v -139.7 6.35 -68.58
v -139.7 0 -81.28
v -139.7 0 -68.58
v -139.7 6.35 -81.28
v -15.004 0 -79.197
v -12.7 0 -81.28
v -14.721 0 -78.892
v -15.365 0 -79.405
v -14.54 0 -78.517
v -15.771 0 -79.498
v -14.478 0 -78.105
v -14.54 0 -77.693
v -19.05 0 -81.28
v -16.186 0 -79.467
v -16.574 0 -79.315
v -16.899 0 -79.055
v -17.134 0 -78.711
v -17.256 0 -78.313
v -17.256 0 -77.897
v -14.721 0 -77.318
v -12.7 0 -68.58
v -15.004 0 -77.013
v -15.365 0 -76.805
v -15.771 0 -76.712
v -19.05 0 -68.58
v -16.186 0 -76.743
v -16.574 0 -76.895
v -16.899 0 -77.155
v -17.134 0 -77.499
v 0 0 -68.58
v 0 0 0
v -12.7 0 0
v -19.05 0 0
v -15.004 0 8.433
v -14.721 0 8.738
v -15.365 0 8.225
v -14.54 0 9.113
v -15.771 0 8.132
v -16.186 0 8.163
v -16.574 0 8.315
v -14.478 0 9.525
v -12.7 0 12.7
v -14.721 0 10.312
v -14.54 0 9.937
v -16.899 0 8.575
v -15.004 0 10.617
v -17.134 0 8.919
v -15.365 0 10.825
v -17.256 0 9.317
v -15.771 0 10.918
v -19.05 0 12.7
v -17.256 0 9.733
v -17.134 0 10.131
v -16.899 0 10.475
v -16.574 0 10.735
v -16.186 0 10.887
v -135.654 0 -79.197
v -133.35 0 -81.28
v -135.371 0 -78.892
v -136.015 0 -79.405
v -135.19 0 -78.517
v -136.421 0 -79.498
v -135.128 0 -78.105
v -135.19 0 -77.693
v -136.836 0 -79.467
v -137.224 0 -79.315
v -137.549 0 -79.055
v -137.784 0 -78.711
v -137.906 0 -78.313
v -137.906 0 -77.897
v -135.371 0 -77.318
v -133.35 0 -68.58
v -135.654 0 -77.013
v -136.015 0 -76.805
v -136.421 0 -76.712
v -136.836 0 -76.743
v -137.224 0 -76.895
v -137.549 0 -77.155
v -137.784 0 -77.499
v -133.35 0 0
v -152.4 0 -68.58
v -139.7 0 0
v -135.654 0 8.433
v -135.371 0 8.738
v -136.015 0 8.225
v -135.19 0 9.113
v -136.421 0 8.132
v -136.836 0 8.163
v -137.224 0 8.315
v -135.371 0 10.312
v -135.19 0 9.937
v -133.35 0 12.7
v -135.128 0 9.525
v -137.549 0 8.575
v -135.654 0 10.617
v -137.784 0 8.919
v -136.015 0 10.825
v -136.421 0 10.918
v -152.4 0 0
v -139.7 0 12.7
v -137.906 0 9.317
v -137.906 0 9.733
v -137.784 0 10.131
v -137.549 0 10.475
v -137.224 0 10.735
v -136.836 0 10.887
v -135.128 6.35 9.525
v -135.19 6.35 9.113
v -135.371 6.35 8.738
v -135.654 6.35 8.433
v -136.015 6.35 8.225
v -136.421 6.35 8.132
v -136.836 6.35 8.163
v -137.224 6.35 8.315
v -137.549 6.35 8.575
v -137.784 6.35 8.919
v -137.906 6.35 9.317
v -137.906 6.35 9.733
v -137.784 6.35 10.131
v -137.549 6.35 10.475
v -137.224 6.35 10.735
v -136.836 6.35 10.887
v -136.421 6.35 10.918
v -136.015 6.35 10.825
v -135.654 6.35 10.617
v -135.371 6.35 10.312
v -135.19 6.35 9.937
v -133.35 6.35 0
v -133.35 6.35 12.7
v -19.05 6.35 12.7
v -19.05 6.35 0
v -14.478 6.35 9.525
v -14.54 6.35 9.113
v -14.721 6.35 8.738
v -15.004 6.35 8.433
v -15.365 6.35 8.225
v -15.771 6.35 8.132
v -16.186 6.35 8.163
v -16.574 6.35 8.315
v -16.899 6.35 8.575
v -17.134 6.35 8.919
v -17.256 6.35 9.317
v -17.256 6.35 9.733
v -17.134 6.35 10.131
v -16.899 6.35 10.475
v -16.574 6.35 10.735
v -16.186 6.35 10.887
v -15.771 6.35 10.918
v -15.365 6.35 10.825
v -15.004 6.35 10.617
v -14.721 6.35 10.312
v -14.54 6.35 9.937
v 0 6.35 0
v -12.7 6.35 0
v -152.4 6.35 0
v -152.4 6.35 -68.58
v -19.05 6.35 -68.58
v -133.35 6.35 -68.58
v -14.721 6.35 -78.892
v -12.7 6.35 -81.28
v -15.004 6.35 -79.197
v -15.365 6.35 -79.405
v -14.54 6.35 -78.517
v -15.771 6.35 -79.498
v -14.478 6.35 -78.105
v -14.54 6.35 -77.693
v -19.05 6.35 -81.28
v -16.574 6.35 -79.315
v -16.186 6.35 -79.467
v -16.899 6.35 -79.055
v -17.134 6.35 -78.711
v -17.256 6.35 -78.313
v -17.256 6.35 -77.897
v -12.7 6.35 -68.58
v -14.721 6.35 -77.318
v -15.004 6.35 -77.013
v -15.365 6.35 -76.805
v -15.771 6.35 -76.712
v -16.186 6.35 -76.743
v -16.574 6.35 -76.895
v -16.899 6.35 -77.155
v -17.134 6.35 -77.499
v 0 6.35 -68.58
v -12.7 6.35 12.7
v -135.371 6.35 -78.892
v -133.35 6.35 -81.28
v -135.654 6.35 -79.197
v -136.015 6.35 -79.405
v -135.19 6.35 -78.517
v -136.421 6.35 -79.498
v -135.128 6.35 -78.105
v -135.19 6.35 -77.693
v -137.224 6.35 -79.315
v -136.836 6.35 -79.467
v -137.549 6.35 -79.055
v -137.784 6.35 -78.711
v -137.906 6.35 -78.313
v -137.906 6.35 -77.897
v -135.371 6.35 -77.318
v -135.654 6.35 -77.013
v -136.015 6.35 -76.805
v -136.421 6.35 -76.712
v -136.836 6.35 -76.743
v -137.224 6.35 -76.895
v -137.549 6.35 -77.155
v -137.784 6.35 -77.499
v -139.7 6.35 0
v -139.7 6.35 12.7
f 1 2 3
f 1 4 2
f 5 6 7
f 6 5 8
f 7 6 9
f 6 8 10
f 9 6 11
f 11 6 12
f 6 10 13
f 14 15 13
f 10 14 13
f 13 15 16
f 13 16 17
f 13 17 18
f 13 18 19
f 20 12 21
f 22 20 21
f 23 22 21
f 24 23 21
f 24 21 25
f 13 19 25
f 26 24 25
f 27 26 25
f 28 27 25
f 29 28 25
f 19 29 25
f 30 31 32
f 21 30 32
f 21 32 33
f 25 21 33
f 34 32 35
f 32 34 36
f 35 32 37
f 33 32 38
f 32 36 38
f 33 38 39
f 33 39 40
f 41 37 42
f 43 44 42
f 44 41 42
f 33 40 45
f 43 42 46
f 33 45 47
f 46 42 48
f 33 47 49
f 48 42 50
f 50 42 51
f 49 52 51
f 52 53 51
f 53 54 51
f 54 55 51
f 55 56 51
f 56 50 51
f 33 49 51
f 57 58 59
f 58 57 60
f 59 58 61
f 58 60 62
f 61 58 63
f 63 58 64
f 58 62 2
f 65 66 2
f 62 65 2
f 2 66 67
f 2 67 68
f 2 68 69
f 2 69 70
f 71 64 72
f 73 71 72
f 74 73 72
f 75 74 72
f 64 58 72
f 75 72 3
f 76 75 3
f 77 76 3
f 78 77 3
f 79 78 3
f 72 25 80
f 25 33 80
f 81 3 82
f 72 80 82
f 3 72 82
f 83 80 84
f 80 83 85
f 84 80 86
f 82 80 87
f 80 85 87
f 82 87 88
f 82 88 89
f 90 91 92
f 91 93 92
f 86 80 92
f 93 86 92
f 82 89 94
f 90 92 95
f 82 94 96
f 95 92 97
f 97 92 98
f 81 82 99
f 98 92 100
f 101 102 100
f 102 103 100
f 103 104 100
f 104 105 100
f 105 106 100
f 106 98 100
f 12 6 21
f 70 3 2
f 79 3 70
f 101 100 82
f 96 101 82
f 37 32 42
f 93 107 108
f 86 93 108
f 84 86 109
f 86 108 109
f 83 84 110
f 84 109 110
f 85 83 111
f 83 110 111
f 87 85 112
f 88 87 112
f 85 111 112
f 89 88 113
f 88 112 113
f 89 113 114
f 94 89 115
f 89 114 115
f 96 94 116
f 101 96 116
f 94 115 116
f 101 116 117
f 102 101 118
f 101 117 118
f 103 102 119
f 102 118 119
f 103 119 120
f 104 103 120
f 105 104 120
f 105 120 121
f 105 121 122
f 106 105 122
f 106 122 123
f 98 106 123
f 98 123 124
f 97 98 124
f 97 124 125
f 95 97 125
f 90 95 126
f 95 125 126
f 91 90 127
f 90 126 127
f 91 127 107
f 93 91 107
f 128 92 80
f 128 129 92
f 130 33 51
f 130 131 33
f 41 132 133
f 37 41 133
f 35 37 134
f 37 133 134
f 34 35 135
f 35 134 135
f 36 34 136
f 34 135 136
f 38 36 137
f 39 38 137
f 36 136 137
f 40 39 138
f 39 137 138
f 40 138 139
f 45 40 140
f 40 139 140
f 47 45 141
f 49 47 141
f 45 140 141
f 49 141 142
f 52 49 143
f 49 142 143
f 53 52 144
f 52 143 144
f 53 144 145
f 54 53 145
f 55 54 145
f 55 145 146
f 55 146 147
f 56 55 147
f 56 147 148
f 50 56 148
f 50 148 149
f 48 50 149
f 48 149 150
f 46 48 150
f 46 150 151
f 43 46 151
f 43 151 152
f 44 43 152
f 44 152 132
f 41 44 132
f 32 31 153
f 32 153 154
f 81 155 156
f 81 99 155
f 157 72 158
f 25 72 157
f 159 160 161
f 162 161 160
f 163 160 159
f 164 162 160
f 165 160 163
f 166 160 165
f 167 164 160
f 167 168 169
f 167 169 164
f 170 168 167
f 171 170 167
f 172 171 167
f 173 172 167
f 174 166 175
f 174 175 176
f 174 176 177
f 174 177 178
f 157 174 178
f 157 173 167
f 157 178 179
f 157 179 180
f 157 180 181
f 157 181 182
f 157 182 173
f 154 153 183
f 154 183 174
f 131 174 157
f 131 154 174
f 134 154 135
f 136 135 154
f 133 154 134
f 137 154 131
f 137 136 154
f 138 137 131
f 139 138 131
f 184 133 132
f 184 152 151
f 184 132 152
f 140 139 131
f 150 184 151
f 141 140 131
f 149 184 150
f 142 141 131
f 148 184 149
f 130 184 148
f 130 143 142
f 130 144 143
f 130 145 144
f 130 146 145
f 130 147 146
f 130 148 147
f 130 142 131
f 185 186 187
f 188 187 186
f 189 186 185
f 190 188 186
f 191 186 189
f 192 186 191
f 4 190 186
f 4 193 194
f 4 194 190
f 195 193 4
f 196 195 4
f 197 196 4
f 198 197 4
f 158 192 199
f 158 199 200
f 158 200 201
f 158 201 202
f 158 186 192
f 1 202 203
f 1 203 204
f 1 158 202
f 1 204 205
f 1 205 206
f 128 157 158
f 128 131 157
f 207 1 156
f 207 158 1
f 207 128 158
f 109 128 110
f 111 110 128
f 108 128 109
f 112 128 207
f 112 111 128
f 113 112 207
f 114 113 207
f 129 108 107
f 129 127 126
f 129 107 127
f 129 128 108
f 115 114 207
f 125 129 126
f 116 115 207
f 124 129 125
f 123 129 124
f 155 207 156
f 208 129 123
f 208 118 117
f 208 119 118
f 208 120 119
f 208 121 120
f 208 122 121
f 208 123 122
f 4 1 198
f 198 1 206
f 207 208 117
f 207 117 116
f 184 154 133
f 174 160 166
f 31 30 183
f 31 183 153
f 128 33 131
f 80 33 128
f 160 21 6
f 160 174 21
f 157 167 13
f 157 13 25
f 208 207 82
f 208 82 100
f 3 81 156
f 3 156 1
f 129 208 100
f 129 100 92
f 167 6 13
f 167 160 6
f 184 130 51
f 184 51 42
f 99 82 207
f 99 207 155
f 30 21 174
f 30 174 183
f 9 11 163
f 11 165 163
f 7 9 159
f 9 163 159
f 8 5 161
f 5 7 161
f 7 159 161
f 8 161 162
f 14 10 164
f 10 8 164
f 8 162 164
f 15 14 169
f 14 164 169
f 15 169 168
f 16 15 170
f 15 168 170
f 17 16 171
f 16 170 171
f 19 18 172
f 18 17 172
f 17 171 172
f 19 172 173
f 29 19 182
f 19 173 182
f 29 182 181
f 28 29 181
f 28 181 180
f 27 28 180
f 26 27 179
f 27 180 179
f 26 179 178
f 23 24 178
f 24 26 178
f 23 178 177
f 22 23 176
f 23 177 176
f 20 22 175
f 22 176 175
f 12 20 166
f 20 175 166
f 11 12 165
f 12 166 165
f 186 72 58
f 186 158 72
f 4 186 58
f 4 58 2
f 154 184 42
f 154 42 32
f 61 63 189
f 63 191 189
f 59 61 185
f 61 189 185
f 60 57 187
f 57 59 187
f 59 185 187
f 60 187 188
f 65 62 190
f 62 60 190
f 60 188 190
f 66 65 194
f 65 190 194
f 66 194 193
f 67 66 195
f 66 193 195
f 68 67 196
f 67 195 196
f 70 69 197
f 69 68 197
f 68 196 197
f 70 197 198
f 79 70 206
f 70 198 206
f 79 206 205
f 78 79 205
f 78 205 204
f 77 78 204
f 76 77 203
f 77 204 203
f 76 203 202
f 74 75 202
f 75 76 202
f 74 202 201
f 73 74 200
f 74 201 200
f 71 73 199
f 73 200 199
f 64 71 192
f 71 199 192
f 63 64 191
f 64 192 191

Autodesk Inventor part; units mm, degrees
ref_plane "YZ Plane" through (0, 0, 0) normal (1, 0, 0) x (0, 1, 0)
ref_plane "XZ Plane" through (0, 0, 0) normal (0, 1, 0) x (-1, 0, 0)
ref_plane "XY Plane" through (0, 0, 0) normal (0, 0, 1) x (1, 0, 0)
sketch "Sketch1" plane through (0, 0, 0) normal (0, 1, 0) x (-1, 0, 0)
  line L0 (0, 0) -> (152.4, 0)
  line L1 (152.4, 0) -> (152.4, -68.58)
  line L2 (152.4, -68.58) -> (0, -68.58)
  line L3 (0, -68.58) -> (0, 0)
  dimension "d0" = 152.4
  dimension "d1" = 68.58
extrude "Extrusion1" add sketch "Sketch1" along normal blind 6.35
sketch "Sketch2" plane through (0, 6.35, 0) normal (0, 1, 0) x (1, 0, 0)
  line L0 (-133.35, 0) -> (-139.7, 0)
  line L1 (-139.7, 0) -> (-139.7, -12.7)
  line L2 (-139.7, -12.7) -> (-133.35, -12.7)
  line L3 (-133.35, -12.7) -> (-133.35, 0)
  circle A0 centre (-136.525, -9.525) radius 1.397
  line L4 (-152.4, 0) -> (0, 0) projected
  line L5 (-12.7, 0) -> (-19.05, 0)
  line L6 (-19.05, 0) -> (-19.05, -12.7)
  line L7 (-19.05, -12.7) -> (-12.7, -12.7)
  line L8 (-12.7, -12.7) -> (-12.7, 0)
  circle A1 centre (-15.875, -9.525) radius 1.397
  dimension "d4" = 12.7
  dimension "d5" = 6.35
  dimension "d6" = 2.794
  dimension "d7" = 3.175
  dimension "d8" = 3.175
  dimension "d9" = 0
  dimension "d10" = 12.7
  dimension "d11" = 12.7
  dimension "d12" = 6.35
  dimension "d13" = 2.794
  dimension "d14" = 3.175
  dimension "d15" = 3.175
  dimension "d16" = 0
  dimension "d17" = 12.7
extrude "Extrusion2" add sketch "Sketch2" against normal blind 6.35
ref_plane "Work Plane1" through (-133.35, 0, -34.29) normal (0, 0, 1) x (1, 0, 0)
mirror "Mirror1" about plane through (-133.35, 0, -34.29) normal (0, 0, 1) of "Extrusion2"
properties part number "BottomPanel"
